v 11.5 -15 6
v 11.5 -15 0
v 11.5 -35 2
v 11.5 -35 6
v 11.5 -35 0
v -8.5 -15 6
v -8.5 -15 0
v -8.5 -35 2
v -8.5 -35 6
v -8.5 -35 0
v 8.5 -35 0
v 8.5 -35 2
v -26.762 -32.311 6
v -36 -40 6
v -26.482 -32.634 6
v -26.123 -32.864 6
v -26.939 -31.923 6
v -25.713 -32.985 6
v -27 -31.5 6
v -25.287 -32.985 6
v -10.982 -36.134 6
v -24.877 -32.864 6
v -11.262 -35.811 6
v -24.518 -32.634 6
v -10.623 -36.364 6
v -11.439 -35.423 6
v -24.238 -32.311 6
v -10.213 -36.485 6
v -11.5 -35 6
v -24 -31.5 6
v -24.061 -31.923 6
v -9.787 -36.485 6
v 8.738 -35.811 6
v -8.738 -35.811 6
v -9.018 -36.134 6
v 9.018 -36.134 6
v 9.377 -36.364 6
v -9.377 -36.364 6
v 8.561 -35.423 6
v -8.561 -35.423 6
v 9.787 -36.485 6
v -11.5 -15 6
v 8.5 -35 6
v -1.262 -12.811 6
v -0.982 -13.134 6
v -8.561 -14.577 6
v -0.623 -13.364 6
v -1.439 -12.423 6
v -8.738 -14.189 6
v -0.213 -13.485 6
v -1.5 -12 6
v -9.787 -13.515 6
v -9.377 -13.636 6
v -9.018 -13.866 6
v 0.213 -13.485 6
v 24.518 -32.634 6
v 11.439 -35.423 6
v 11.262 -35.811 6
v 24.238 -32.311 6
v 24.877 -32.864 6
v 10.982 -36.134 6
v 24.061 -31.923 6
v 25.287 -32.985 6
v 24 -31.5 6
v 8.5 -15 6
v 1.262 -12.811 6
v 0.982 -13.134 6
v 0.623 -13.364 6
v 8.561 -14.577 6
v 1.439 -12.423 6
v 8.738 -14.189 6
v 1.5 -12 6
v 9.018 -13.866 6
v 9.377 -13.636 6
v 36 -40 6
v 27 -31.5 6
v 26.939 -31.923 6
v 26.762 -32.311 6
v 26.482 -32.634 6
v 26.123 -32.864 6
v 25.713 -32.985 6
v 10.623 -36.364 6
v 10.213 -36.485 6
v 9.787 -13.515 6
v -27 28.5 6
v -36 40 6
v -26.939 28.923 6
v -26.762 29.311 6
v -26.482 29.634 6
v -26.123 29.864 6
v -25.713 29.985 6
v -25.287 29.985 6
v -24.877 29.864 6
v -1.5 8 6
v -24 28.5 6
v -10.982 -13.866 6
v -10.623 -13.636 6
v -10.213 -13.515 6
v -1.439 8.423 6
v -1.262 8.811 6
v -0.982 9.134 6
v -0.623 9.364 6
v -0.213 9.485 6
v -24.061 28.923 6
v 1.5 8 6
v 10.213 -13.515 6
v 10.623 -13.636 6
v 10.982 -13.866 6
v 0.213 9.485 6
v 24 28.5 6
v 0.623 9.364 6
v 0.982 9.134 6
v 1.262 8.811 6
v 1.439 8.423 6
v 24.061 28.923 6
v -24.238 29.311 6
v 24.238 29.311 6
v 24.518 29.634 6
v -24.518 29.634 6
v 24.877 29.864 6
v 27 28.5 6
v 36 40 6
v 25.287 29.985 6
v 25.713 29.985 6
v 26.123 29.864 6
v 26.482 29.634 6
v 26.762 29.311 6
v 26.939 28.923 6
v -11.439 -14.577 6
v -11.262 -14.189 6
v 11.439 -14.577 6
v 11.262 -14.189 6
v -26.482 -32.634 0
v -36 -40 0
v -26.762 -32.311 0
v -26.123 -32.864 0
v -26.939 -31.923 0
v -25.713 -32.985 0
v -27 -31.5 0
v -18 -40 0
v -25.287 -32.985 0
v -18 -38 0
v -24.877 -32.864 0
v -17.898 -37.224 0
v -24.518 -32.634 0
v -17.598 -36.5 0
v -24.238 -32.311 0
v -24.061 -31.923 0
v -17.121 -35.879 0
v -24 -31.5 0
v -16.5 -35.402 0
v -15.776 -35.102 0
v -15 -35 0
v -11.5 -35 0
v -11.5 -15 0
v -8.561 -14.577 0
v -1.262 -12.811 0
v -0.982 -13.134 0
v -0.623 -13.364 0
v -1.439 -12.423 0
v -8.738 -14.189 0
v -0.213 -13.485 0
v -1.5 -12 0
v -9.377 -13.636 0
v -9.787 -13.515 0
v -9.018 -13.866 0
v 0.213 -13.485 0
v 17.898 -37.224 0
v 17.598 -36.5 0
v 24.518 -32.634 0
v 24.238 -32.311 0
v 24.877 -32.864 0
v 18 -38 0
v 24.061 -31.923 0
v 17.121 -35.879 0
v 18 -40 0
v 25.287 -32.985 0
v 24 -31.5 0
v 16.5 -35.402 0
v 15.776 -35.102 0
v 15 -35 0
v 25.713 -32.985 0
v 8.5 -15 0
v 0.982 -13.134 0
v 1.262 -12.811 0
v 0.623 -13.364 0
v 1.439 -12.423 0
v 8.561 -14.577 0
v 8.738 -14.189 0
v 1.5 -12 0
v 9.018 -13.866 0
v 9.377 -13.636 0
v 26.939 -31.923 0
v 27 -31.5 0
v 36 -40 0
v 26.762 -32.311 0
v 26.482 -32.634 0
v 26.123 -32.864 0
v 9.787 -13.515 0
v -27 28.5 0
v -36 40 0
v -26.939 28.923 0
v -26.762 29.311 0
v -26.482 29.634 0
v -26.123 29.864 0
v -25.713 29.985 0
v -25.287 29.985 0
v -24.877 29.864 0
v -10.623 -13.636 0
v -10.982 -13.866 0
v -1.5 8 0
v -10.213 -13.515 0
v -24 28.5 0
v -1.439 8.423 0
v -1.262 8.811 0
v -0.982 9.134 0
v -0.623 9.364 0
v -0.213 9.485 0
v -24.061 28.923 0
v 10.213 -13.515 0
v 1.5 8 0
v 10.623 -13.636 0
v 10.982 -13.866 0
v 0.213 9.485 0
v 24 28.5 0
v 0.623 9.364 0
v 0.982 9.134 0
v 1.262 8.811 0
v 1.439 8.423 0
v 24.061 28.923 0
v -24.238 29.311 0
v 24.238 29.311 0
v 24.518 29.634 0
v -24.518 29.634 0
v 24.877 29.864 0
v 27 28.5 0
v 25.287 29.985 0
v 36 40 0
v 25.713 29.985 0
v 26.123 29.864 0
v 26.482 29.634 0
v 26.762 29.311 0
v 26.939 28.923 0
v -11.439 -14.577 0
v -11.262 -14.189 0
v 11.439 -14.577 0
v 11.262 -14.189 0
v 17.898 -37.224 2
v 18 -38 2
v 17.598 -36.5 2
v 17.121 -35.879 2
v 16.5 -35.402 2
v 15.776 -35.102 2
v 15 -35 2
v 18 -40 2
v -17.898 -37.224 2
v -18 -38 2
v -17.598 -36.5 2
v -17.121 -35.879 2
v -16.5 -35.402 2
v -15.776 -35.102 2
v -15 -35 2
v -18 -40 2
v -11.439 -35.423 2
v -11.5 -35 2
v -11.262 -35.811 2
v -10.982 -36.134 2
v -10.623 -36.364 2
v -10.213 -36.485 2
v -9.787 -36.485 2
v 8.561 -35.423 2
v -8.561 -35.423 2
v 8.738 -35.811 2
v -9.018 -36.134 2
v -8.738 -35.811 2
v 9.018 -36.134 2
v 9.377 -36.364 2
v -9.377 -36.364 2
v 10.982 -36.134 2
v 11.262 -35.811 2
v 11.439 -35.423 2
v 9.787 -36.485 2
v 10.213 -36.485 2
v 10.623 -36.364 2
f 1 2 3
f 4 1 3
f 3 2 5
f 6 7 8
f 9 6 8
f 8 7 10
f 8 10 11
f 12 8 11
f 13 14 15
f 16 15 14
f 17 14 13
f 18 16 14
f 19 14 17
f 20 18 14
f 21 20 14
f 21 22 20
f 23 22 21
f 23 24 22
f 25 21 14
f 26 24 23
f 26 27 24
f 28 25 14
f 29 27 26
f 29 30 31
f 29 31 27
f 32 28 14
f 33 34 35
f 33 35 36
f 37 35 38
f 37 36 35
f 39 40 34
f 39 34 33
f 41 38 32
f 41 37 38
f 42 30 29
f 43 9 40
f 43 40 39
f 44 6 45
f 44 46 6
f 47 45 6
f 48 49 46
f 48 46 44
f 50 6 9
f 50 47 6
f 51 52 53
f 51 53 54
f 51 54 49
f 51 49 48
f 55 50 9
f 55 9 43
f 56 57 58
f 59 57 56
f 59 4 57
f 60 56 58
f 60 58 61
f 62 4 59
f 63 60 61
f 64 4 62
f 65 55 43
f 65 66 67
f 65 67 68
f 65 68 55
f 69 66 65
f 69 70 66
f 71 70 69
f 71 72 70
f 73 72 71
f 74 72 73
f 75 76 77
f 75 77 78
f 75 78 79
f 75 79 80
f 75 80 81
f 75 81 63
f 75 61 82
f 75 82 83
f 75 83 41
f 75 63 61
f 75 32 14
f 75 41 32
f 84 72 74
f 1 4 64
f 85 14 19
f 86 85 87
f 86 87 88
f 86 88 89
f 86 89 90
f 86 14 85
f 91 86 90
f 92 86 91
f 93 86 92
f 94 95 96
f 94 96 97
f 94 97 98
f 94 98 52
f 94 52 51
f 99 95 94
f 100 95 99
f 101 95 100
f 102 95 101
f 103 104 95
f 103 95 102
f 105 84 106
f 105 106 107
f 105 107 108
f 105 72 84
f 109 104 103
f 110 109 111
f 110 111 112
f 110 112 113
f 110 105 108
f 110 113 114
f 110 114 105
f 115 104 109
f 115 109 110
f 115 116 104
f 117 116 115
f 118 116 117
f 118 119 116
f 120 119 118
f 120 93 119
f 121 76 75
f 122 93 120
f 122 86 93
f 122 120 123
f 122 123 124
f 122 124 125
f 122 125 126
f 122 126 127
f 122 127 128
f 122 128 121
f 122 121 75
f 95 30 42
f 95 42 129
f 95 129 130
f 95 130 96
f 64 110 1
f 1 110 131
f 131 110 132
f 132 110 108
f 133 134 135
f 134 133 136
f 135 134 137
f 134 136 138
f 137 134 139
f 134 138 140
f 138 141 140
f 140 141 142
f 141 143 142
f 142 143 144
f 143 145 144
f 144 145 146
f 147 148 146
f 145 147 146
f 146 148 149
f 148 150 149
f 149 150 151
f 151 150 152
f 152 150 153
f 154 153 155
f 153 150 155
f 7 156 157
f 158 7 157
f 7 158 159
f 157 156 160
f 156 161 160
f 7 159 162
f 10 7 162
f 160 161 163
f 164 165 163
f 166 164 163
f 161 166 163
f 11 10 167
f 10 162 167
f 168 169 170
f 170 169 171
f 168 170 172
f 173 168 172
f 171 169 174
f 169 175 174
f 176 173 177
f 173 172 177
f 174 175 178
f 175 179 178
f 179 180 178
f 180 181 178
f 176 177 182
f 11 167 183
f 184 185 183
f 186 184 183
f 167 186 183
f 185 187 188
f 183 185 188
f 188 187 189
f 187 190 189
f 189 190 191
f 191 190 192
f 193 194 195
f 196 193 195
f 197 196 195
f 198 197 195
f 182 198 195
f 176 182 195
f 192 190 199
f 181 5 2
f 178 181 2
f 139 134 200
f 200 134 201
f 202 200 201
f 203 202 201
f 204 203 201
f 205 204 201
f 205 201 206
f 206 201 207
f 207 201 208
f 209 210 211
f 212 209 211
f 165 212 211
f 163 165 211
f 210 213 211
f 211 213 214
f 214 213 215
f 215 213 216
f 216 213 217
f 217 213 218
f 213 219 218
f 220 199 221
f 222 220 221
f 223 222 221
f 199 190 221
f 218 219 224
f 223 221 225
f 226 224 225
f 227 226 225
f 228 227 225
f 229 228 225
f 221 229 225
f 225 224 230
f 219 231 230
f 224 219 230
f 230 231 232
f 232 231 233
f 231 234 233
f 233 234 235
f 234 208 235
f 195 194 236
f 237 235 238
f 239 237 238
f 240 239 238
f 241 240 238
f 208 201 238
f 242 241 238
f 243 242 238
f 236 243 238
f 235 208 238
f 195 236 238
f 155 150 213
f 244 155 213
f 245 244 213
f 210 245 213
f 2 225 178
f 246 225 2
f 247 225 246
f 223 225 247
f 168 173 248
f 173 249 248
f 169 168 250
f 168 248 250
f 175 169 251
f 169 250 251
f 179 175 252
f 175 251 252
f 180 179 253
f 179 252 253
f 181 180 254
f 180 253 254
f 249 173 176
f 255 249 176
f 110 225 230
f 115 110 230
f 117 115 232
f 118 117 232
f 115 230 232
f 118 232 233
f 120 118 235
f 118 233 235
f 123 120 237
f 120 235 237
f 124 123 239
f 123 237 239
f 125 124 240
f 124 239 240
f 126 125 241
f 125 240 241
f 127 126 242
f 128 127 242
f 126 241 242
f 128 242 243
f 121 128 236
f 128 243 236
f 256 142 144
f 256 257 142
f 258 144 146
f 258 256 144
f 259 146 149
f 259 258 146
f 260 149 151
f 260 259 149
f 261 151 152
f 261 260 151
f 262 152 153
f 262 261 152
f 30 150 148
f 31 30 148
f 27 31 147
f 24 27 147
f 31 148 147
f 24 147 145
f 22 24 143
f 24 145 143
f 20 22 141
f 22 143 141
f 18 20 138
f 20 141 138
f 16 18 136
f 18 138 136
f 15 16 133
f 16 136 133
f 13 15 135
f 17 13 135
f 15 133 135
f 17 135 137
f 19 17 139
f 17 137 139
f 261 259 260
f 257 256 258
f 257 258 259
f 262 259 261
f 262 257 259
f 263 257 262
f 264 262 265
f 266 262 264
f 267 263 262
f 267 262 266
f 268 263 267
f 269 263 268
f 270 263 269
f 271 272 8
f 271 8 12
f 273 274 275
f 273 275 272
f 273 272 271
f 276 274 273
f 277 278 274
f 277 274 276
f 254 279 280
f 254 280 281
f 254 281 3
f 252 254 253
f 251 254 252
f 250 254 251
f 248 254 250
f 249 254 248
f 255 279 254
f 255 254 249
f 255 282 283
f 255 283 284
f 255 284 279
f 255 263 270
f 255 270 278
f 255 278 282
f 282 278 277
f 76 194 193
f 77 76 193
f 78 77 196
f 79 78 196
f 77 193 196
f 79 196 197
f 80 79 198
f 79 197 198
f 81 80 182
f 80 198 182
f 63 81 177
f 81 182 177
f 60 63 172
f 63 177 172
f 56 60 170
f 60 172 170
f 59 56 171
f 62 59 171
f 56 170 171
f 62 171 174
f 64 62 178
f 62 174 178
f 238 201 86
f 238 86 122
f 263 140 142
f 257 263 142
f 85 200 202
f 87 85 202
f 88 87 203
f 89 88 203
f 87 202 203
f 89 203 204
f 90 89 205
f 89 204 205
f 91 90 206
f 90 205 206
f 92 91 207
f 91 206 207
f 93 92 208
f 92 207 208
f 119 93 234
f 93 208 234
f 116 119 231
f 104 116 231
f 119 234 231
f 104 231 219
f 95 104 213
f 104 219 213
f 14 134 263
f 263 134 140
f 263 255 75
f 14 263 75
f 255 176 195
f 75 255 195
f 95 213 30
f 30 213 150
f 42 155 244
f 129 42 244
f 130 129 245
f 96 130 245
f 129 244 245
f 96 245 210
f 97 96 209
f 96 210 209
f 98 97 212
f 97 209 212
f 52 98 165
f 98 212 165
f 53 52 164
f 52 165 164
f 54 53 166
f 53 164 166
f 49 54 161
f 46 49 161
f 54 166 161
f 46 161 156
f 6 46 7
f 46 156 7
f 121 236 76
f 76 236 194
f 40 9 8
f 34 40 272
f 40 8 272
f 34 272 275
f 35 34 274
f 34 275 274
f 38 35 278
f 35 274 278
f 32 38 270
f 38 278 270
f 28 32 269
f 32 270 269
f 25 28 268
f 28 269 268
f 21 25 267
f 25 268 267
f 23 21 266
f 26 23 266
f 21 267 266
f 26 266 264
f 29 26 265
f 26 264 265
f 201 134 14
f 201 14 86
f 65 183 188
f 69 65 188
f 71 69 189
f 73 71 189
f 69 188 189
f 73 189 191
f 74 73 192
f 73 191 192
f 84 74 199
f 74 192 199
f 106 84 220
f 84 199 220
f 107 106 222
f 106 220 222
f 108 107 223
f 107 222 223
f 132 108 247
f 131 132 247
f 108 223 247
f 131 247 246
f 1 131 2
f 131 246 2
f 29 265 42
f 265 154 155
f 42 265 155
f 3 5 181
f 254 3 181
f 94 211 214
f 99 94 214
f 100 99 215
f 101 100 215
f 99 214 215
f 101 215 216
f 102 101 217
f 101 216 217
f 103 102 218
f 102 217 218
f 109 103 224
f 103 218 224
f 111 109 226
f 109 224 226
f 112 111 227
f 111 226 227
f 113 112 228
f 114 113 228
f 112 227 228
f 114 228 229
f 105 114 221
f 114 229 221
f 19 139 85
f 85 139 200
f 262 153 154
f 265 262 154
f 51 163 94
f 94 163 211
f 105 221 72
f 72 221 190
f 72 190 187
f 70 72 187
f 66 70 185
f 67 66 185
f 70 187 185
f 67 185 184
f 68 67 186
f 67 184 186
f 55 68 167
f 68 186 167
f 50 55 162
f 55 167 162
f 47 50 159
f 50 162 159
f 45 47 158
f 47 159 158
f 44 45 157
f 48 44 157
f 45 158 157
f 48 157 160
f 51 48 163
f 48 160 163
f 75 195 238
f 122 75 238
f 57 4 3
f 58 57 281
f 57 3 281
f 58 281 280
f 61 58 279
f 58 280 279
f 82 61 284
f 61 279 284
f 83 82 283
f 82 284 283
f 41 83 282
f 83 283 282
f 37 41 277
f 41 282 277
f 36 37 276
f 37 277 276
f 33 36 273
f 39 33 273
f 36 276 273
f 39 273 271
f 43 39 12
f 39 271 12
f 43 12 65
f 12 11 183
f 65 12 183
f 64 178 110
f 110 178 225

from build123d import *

# Parameters (mm, degrees)
F0_W     = 72
F0_H     = 80
F1_DEPTH = 6
F2_DEPTH = 6
F4_DEPTH = 2
F5_R     = 3


with BuildPart() as f1:
    # F0 (on Top) → F1 (new body)
    with BuildSketch(Plane.XY):
        Rectangle(F0_W, F0_H)
        with BuildLine():
            ThreePointArc((-8.5, -35), (-10, -36.5), (-11.5, -35))
            Line((-11.5, -35), (-11.5, -15))
            ThreePointArc((-11.5, -15), (-10, -13.5), (-8.5, -15))
            Line((-8.5, -15), (-8.5, -35))
        make_face(mode=Mode.SUBTRACT)
        with BuildLine():
            Line((-24, 28.5), (-24, -31.5))
            ThreePointArc((-24, -31.5), (-25.5, -33), (-27, -31.5))
            Line((-27, -31.5), (-27, 28.5))
            ThreePointArc((-27, 28.5), (-25.5, 30), (-24, 28.5))
        make_face(mode=Mode.SUBTRACT)
        with BuildLine():
            ThreePointArc((11.5, -35), (10, -36.5), (8.5, -35))
            Line((8.5, -35), (8.5, -15))
            ThreePointArc((8.5, -15), (10, -13.5), (11.5, -15))
            Line((11.5, -15), (11.5, -35))
        make_face(mode=Mode.SUBTRACT)
        with BuildLine():
            Line((-1.5, -12), (-1.5, 8))
            ThreePointArc((-1.5, 8), (0, 9.5), (1.5, 8))
            Line((1.5, 8), (1.5, -12))
            ThreePointArc((1.5, -12), (0, -13.5), (-1.5, -12))
        make_face(mode=Mode.SUBTRACT)
        with BuildLine():
            ThreePointArc((24, 28.5), (25.5, 30), (27, 28.5))
            Line((27, 28.5), (27, -31.5))
            ThreePointArc((27, -31.5), (25.5, -33), (24, -31.5))
            Line((24, -31.5), (24, 28.5))
        make_face(mode=Mode.SUBTRACT)
    extrude(amount=F1_DEPTH)

    # F0 (on Top) → F2 (cut)
    with BuildSketch(Plane.XY):
        Rectangle(F0_W, F0_H)
        with BuildLine():
            ThreePointArc((-8.5, -35), (-10, -36.5), (-11.5, -35))
            Line((-11.5, -35), (-11.5, -15))
            ThreePointArc((-11.5, -15), (-10, -13.5), (-8.5, -15))
            Line((-8.5, -15), (-8.5, -35))
        make_face(mode=Mode.SUBTRACT)
        with BuildLine():
            Line((-24, 28.5), (-24, -31.5))
            ThreePointArc((-24, -31.5), (-25.5, -33), (-27, -31.5))
            Line((-27, -31.5), (-27, 28.5))
            ThreePointArc((-27, 28.5), (-25.5, 30), (-24, 28.5))
        make_face(mode=Mode.SUBTRACT)
        with BuildLine():
            ThreePointArc((11.5, -35), (10, -36.5), (8.5, -35))
            Line((8.5, -35), (8.5, -15))
            ThreePointArc((8.5, -15), (10, -13.5), (11.5, -15))
            Line((11.5, -15), (11.5, -35))
        make_face(mode=Mode.SUBTRACT)
        with BuildLine():
            Line((-1.5, -12), (-1.5, 8))
            ThreePointArc((-1.5, 8), (0, 9.5), (1.5, 8))
            Line((1.5, 8), (1.5, -12))
            ThreePointArc((1.5, -12), (0, -13.5), (-1.5, -12))
        make_face(mode=Mode.SUBTRACT)
        with BuildLine():
            ThreePointArc((24, 28.5), (25.5, 30), (27, 28.5))
            Line((27, 28.5), (27, -31.5))
            ThreePointArc((27, -31.5), (25.5, -33), (24, -31.5))
            Line((24, -31.5), (24, 28.5))
        make_face(mode=Mode.SUBTRACT)
    extrude(amount=-F2_DEPTH, mode=Mode.SUBTRACT)

    # F3 (on face) → F4 (cut)
    with BuildSketch(Plane(origin=(0, 0, 0), x_dir=(1, 0, 0), z_dir=(0, 0, -1))):
        with BuildLine():
            Line((18, 35), (18, 40))
            Line((18, 40), (-18, 40))
            Line((-18, 40), (-18, 35))
            Line((-18, 35), (-11.5, 35))
            ThreePointArc((-11.5, 35), (-10, 36.5), (-8.5, 35))
            Line((-8.5, 35), (8.5, 35))
            ThreePointArc((8.5, 35), (10, 36.5), (11.5, 35))
            Line((11.5, 35), (18, 35))
        make_face()
    extrude(amount=-F4_DEPTH, mode=Mode.SUBTRACT)

    # F5
    f5_edges = [f1.edges().sort_by_distance(p)[0] for p in [
        (-18, -35, 1),
        (18, -35, 1),
    ]]
    fillet(f5_edges, radius=F5_R)


solid = f1.part
